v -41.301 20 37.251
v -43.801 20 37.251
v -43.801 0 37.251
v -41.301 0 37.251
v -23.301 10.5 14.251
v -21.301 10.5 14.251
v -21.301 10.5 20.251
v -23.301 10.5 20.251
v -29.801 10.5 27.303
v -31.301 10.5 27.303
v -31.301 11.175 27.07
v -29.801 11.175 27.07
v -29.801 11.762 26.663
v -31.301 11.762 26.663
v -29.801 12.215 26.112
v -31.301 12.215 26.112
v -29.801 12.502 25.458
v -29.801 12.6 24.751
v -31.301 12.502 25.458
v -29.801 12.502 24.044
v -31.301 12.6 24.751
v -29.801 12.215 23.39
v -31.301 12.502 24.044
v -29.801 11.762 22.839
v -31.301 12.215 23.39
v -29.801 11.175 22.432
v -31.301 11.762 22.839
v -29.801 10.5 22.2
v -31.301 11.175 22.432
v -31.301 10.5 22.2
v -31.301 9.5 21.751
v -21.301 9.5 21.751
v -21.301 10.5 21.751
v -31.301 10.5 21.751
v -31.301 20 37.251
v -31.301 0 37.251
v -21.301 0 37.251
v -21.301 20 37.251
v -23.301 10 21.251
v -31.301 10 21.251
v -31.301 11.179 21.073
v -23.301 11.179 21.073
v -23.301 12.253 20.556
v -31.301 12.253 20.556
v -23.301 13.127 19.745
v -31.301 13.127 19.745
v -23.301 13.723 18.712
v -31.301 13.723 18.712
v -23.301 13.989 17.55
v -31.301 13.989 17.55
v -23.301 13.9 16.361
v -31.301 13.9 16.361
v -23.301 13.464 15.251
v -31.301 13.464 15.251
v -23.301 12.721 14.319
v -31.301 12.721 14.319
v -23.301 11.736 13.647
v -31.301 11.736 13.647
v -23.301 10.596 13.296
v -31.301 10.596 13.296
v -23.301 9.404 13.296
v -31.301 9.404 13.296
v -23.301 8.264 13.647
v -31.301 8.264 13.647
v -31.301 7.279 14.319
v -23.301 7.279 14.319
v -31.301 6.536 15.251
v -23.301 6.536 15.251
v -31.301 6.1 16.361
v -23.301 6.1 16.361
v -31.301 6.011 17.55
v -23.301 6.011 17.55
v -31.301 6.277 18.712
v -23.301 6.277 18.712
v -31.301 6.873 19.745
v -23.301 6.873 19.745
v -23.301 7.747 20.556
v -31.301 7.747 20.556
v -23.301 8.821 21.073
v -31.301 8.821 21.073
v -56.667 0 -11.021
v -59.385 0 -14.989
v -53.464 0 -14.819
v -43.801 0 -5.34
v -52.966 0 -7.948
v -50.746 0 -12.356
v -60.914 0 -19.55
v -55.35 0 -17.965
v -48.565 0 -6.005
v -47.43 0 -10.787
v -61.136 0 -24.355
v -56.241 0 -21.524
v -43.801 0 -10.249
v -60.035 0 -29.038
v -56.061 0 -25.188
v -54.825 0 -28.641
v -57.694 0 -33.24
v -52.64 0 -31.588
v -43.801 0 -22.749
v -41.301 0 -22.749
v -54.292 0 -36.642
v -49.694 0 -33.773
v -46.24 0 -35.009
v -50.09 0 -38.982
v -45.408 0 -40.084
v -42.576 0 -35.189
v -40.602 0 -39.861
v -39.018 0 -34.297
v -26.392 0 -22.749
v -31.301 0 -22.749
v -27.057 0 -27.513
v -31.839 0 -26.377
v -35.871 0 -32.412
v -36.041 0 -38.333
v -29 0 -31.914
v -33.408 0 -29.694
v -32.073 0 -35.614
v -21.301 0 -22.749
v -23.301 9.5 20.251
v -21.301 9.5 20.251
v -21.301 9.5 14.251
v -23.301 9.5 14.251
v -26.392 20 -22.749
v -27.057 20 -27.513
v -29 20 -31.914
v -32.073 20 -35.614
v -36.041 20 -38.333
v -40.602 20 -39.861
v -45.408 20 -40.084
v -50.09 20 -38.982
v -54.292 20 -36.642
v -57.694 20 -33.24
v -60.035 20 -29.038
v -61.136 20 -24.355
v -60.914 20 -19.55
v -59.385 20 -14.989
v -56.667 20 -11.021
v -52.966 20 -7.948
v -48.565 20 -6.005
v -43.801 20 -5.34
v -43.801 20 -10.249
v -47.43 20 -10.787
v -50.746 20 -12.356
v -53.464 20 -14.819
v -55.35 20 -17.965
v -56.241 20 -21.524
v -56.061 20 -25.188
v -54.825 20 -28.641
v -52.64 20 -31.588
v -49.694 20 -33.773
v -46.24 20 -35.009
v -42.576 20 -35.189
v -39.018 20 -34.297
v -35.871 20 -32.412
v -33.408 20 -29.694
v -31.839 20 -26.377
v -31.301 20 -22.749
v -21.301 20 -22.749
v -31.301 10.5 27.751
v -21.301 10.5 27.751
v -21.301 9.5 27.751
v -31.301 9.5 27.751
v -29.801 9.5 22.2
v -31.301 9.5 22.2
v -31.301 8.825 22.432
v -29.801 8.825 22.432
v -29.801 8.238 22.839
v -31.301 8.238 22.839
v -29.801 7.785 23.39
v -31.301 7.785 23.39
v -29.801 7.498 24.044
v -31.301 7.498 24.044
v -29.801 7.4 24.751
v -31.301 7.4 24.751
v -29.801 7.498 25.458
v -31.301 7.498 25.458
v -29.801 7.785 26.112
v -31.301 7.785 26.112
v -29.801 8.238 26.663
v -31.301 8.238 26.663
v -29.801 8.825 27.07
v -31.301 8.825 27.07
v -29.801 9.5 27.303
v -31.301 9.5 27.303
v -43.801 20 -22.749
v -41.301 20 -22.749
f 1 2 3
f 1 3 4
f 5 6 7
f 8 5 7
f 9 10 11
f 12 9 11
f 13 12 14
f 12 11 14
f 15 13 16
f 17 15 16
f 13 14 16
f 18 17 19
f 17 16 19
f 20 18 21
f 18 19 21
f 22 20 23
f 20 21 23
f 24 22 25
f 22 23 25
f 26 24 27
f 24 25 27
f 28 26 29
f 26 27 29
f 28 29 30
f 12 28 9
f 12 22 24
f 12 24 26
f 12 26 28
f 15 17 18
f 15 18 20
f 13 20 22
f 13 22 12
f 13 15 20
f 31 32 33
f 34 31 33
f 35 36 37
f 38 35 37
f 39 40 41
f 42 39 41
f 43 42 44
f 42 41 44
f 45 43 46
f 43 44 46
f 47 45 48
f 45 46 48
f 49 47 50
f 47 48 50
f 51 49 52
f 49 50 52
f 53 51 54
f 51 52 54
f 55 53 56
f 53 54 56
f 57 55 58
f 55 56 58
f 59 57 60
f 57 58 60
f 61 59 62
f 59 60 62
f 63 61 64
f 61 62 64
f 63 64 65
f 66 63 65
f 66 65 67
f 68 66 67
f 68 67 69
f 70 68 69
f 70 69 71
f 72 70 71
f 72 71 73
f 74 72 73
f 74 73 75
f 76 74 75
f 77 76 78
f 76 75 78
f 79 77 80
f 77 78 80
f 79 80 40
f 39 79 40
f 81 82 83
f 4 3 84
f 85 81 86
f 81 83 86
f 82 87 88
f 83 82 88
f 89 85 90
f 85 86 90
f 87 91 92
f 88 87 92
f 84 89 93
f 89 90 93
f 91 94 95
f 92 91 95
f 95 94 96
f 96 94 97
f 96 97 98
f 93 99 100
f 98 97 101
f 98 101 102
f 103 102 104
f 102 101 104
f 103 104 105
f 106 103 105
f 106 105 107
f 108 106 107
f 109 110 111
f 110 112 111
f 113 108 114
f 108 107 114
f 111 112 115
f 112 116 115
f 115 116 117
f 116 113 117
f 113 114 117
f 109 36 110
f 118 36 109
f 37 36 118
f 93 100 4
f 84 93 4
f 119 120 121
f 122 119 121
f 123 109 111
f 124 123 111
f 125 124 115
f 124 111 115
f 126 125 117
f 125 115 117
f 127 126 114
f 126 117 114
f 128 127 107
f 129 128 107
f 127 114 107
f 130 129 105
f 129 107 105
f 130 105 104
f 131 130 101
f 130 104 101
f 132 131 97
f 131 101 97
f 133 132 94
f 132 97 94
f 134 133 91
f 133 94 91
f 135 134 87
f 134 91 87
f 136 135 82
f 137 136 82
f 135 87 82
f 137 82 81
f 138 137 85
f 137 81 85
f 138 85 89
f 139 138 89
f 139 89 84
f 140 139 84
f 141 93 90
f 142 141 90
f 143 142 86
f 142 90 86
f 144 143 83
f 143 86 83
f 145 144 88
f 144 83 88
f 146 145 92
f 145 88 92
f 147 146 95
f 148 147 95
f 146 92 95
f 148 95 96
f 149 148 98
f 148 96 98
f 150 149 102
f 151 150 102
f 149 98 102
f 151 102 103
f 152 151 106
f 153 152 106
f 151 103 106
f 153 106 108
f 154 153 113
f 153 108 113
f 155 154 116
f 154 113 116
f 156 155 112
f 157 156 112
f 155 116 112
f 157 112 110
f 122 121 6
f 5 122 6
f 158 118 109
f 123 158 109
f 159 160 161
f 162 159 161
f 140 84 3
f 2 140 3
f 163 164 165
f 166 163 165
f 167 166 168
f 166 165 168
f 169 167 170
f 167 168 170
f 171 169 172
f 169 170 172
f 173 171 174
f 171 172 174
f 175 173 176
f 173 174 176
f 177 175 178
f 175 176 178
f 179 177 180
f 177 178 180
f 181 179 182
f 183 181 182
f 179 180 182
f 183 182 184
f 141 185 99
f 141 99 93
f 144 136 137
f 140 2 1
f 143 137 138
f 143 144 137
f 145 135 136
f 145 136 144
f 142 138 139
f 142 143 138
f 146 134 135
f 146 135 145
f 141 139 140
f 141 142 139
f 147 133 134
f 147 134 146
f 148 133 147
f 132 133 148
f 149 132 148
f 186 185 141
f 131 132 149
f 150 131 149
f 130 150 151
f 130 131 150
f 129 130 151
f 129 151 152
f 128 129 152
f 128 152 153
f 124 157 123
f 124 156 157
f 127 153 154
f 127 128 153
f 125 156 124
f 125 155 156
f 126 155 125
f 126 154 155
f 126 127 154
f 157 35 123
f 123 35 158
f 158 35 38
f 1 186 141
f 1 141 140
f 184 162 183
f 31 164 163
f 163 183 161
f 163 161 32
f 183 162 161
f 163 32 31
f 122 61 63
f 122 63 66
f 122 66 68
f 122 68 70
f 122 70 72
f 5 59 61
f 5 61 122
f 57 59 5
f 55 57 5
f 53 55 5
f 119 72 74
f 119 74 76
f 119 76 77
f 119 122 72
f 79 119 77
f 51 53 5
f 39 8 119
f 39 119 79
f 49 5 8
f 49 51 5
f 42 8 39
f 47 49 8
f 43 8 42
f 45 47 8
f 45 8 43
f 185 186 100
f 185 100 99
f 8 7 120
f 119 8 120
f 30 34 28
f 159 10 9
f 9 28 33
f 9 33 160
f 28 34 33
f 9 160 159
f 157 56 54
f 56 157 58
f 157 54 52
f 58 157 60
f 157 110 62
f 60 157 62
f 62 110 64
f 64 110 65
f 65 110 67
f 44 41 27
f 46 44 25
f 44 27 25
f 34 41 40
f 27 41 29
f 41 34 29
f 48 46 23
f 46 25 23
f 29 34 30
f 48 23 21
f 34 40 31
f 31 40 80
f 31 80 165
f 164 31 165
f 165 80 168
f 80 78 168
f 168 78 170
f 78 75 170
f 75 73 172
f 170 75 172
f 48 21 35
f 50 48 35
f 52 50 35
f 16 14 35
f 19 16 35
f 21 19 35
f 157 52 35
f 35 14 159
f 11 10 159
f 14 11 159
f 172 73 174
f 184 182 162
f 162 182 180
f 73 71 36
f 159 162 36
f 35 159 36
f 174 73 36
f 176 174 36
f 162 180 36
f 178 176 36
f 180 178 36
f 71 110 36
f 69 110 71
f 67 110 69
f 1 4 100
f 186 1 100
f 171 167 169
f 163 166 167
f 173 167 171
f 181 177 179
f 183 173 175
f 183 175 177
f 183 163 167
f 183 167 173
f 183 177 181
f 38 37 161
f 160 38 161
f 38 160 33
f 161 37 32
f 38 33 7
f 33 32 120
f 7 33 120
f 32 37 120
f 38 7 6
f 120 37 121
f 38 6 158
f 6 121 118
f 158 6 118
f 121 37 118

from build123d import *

# Parameters (mm, degrees)
BOSS_EXTRUDE1_DEPTH = 20
SKETCH2_R           = 4
CUT_EXTRUDE2_DEPTH  = 8
CUT_EXTRUDE4_DEPTH  = 10
SKETCH4_R           = 2.6
CUT_EXTRUDE5_DEPTH  = 1.5


with BuildPart() as part:
    # Sketch1 → Boss-Extrude1 (new body)
    with BuildSketch(Plane(origin=(0, 0, 0), x_dir=(1, 0, 0), z_dir=(0, 1, 0))):
        with BuildLine():
            Line((-41.301242739, 22.74889672), (-43.801242739, 22.74889672))
            Line((-43.801242739, 22.74889672), (-43.801242739, 10.24889672))
            ThreePointArc((-43.801242739, 10.24889672), (-52.640077504, 31.587731485), (-31.301242739, 22.74889672))
            Line((-31.301242739, 22.74889672), (-31.301242739, -37.25110328))
            Line((-31.301242739, -37.25110328), (-21.301242739, -37.25110328))
            Line((-21.301242739, -37.25110328), (-21.301242739, 22.74889672))
            Line((-21.301242739, 22.74889672), (-26.392335279, 22.74889672))
            ThreePointArc((-26.392335279, 22.74889672), (-56.111199256, 35.058853238), (-43.801242739, 5.339989261))
            Line((-43.801242739, 5.339989261), (-43.801242739, -37.25110328))
            Line((-43.801242739, -37.25110328), (-41.301242739, -37.25110328))
            Line((-41.301242739, -37.25110328), (-41.301242739, 22.74889672))
        make_face()
    extrude(amount=BOSS_EXTRUDE1_DEPTH)

    # Sketch2 → Cut-Extrude2 (cut)
    with BuildSketch(Plane.ZY.offset(31.301242739)):
        with Locations((17.25110328, 10)):
            Circle(SKETCH2_R)
    extrude(amount=-CUT_EXTRUDE2_DEPTH, mode=Mode.SUBTRACT)

    # Sketch3 → Cut-Extrude4 (cut)
    with BuildSketch(Plane(origin=(-21.301242739, 0, 0), x_dir=(0, 0, -1), z_dir=(1, 0, 0))):
        Polygon((-24.75110328, 10), (-27.75110328, 10.5), (-27.75110328, 9.5), align=None)
        Polygon((-21.75110328, 10.5), (-27.75110328, 10.5), (-24.75110328, 10), align=None)
        Polygon((-21.75110328, 10.5), (-24.75110328, 10), (-21.75110328, 9.5), align=None)
        Polygon((-21.75110328, 9.5), (-24.75110328, 10), (-27.75110328, 9.5), align=None)
        Polygon((-17.25110328, 10), (-20.25110328, 10.5), (-20.25110328, 9.5), align=None)
        Polygon((-14.25110328, 10.5), (-17.25110328, 10), (-14.25110328, 9.5), align=None)
        Polygon((-14.25110328, 10.5), (-20.25110328, 10.5), (-17.25110328, 10), align=None)
        Polygon((-14.25110328, 9.5), (-17.25110328, 10), (-20.25110328, 9.5), align=None)
    extrude(amount=-CUT_EXTRUDE4_DEPTH, mode=Mode.SUBTRACT)

    # Sketch4 → Cut-Extrude5 (cut)
    with BuildSketch(Plane.ZY.offset(31.301242739)):
        with Locations((24.75110328, 10)):
            Circle(SKETCH4_R)
    extrude(amount=-CUT_EXTRUDE5_DEPTH, mode=Mode.SUBTRACT)


solid = part.part
